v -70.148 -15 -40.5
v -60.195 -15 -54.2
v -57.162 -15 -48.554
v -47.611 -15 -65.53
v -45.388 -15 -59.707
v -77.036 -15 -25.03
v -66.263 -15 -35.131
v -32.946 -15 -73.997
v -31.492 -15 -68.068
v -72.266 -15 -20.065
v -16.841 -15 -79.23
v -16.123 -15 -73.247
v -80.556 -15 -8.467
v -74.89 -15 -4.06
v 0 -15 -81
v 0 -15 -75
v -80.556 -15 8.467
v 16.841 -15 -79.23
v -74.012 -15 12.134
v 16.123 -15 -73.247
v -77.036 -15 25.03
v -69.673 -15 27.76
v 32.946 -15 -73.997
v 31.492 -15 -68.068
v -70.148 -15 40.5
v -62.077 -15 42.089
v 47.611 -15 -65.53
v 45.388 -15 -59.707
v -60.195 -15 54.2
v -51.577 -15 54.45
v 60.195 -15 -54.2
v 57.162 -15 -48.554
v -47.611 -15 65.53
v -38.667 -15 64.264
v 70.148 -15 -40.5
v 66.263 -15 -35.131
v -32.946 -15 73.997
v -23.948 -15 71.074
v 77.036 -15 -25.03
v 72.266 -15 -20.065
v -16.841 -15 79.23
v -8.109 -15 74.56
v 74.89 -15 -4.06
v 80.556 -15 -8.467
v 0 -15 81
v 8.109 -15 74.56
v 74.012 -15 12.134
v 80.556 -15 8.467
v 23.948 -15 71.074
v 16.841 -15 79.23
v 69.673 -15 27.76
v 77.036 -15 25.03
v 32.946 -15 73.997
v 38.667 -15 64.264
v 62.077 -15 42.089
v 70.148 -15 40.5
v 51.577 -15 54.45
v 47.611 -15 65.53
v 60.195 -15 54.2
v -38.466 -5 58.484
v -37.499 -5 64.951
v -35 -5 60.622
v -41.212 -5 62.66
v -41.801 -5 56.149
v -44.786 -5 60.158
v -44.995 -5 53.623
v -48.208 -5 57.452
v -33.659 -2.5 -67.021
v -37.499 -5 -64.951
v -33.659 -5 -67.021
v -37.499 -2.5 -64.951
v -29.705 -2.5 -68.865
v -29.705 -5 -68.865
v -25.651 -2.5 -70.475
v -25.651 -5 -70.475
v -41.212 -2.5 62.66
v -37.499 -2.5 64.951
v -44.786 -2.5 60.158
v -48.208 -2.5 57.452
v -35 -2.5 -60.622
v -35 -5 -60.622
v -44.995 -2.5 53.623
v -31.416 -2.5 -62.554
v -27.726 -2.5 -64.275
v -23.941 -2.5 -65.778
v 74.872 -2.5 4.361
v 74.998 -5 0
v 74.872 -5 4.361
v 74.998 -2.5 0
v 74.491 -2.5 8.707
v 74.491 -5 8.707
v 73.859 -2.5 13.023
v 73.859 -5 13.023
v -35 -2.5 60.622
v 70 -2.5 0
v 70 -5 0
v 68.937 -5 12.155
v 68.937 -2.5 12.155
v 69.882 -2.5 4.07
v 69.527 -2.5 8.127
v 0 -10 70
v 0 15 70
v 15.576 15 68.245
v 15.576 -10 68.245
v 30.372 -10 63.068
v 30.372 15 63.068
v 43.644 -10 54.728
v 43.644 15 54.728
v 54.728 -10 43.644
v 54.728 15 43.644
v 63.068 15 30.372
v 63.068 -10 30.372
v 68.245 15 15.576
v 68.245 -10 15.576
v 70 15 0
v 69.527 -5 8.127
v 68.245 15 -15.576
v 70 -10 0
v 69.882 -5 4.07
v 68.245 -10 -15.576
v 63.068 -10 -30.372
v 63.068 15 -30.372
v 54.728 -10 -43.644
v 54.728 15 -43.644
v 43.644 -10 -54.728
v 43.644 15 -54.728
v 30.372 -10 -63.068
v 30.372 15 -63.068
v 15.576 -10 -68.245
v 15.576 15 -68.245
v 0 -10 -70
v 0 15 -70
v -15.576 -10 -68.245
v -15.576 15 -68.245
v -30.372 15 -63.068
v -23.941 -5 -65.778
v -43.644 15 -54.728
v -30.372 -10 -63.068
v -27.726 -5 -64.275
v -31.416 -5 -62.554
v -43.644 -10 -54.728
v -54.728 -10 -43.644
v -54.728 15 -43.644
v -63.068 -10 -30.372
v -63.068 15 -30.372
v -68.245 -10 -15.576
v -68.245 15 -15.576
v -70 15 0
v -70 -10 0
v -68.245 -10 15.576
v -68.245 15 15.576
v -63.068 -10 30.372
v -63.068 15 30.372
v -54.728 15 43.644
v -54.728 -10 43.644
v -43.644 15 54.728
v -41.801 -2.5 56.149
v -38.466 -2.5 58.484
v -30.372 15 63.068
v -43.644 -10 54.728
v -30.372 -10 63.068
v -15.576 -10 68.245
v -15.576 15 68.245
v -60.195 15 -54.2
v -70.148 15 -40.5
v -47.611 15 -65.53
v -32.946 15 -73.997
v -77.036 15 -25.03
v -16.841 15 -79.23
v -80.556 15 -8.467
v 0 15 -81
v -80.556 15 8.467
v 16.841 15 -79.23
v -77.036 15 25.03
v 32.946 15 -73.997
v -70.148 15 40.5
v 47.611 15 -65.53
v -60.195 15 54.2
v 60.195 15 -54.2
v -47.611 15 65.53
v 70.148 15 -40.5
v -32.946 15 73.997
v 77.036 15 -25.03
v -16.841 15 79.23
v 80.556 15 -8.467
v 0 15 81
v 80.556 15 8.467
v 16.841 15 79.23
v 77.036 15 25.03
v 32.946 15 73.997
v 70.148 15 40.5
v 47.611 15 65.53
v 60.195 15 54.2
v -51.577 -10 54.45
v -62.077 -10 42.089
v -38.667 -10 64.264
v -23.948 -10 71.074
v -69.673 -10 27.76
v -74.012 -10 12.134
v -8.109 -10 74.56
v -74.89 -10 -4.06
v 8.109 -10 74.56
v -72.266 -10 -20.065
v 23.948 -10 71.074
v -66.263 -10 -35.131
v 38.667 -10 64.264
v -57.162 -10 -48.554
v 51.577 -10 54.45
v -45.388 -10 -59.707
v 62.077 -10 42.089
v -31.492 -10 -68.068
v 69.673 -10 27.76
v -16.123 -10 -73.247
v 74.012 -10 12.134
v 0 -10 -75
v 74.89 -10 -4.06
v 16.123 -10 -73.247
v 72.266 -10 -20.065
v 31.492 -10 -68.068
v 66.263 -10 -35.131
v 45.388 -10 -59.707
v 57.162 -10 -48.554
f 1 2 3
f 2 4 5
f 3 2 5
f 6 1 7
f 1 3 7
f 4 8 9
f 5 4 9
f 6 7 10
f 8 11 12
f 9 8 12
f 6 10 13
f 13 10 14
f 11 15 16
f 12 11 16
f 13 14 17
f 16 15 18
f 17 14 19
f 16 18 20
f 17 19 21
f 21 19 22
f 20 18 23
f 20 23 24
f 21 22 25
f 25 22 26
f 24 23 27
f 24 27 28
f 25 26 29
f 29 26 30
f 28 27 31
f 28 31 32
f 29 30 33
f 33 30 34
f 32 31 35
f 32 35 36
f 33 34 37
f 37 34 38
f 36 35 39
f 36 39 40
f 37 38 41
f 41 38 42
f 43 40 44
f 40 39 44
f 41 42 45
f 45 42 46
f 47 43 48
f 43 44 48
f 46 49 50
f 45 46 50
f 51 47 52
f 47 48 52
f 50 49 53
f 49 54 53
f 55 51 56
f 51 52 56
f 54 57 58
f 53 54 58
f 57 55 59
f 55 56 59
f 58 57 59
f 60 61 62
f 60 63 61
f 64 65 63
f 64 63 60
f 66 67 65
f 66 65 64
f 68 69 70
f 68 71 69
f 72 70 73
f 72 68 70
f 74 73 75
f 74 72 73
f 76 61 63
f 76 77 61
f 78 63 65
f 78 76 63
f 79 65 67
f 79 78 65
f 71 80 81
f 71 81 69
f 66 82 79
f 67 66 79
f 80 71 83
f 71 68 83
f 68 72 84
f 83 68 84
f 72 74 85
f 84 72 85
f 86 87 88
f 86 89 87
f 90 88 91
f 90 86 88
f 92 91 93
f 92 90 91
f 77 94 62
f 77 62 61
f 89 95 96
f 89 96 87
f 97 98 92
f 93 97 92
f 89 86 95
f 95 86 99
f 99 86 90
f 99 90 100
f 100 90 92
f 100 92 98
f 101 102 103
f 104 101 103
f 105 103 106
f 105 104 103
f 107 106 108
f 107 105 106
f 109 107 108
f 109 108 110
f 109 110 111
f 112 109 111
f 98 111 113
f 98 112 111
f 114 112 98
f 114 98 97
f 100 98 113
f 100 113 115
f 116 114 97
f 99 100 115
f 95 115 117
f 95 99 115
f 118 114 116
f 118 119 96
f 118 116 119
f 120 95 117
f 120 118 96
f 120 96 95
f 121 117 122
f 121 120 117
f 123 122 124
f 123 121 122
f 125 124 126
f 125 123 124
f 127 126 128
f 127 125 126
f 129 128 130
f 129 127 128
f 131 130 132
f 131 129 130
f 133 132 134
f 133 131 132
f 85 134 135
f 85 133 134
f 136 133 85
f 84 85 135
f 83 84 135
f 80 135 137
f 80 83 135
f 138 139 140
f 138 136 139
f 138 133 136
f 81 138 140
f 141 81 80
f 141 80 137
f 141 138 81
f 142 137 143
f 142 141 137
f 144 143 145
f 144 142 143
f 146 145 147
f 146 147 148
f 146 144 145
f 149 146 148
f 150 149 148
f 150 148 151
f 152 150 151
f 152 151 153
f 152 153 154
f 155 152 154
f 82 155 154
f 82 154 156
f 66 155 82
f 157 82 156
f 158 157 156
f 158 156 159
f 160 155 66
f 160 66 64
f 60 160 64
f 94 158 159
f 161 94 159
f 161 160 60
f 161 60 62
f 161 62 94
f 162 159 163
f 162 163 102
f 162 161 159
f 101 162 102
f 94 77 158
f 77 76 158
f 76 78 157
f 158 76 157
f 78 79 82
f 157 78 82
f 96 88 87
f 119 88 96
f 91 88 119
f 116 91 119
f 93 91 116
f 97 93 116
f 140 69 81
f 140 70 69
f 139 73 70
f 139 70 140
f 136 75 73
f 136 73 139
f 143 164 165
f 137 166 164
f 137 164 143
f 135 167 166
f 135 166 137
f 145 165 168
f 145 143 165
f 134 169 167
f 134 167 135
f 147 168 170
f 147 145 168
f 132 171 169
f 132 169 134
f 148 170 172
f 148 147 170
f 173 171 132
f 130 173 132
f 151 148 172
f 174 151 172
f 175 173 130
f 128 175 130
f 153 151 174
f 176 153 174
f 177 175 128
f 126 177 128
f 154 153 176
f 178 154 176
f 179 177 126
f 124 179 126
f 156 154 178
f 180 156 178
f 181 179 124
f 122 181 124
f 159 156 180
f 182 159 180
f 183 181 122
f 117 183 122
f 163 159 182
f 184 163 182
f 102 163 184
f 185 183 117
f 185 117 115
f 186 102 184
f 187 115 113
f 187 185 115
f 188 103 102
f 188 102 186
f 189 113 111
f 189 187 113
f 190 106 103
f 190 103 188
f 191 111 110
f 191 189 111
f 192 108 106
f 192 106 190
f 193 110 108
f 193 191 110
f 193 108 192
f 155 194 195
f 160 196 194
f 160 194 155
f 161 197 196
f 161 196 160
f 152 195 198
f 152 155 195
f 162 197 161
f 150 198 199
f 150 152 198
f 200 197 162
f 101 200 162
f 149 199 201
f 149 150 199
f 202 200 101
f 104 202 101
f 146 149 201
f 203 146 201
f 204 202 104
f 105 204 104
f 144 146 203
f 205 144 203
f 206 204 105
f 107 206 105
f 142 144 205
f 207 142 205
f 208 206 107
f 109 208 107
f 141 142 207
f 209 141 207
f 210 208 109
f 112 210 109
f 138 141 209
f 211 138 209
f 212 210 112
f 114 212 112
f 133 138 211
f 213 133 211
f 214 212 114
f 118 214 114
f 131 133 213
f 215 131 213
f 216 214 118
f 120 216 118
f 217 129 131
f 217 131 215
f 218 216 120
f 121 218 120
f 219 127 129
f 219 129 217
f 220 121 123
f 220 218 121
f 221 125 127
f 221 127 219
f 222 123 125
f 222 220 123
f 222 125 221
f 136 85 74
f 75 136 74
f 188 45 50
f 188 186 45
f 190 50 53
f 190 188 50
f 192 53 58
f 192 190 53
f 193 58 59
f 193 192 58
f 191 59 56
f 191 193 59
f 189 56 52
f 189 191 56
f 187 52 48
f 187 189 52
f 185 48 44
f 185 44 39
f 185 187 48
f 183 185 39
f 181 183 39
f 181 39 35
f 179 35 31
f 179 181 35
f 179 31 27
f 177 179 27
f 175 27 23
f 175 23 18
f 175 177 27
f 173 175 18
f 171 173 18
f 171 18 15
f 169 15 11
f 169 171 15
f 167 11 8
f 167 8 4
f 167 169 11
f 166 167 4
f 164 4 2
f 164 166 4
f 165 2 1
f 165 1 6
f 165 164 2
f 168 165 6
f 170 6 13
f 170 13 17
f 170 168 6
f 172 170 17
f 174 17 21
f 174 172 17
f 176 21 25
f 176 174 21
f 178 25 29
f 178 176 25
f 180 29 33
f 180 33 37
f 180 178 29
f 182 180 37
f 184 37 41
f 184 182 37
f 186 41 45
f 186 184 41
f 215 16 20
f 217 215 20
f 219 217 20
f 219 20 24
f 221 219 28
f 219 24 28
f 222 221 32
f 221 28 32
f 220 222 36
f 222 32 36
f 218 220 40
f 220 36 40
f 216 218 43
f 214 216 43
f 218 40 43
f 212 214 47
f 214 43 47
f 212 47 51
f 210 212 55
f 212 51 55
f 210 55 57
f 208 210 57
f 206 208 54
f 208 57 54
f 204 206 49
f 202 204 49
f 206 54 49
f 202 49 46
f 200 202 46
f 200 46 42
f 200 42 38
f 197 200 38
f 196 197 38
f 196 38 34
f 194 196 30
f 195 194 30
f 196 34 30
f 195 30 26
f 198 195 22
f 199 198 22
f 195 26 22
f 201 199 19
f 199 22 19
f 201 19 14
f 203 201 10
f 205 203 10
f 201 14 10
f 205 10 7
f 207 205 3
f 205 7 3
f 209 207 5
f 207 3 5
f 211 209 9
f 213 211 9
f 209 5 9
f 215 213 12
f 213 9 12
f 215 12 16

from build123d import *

# Parameters (mm, degrees)
SKETCH_1_R               = 81
SKETCH_1_R_2             = 70
EXTRUDE_1_DEPTH          = 15
SKETCH_2_W               = 5
SKETCH_2_H               = 2.5
CUT_REVOLVE_1_ANGLE      = 10
PATTERN_CIRCULAR_1_COUNT = 3
SKETCH_3_R               = 75
CUT_EXTRUDE_1_DEPTH      = 5


with BuildPart() as part:
    # 草圖1 → 填料-伸長1 (new, symmetric)
    with BuildSketch(Plane(origin=(0, 0, 0), x_dir=(1, 0, 0), z_dir=(0, 1, 0))):
        with Locations(Location((0, 0, 0), (0, 0, 270))):
            Circle(SKETCH_1_R)
        with Locations(Location((0, 0, 0), (0, 0, 270))):
            Circle(SKETCH_1_R_2, mode=Mode.SUBTRACT)
    extrude(amount=EXTRUDE_1_DEPTH, both=True)

    # 草圖2 → 除料-旋轉1 (revolve, cut)
    with BuildSketch(Plane.XY):
        with Locations((72.498409613, -3.75)):
            Rectangle(SKETCH_2_W, SKETCH_2_H)
    cut_revolve_1 = revolve(axis=Axis((0, 15, 0), (0, -1, 0)), revolution_arc=CUT_REVOLVE_1_ANGLE, mode=Mode.SUBTRACT)

    # 環狀複製排列1: 除料-旋轉1 ×3 about axis
    pattern_circular_1_axis = Axis((0, 0, 0), (0, 1, 0))
    for i in range(1, PATTERN_CIRCULAR_1_COUNT):
        add(cut_revolve_1.rotate(pattern_circular_1_axis, i * 360 / PATTERN_CIRCULAR_1_COUNT), mode=Mode.SUBTRACT)

    # 草圖3 → 除料-伸長1 (cut)
    with BuildSketch(Plane.XZ.offset(15)):
        with Locations(Location((0, 0, 0), (0, 0, 270))):
            Circle(SKETCH_3_R)
    extrude(amount=-CUT_EXTRUDE_1_DEPTH, mode=Mode.SUBTRACT)


solid = part.part
